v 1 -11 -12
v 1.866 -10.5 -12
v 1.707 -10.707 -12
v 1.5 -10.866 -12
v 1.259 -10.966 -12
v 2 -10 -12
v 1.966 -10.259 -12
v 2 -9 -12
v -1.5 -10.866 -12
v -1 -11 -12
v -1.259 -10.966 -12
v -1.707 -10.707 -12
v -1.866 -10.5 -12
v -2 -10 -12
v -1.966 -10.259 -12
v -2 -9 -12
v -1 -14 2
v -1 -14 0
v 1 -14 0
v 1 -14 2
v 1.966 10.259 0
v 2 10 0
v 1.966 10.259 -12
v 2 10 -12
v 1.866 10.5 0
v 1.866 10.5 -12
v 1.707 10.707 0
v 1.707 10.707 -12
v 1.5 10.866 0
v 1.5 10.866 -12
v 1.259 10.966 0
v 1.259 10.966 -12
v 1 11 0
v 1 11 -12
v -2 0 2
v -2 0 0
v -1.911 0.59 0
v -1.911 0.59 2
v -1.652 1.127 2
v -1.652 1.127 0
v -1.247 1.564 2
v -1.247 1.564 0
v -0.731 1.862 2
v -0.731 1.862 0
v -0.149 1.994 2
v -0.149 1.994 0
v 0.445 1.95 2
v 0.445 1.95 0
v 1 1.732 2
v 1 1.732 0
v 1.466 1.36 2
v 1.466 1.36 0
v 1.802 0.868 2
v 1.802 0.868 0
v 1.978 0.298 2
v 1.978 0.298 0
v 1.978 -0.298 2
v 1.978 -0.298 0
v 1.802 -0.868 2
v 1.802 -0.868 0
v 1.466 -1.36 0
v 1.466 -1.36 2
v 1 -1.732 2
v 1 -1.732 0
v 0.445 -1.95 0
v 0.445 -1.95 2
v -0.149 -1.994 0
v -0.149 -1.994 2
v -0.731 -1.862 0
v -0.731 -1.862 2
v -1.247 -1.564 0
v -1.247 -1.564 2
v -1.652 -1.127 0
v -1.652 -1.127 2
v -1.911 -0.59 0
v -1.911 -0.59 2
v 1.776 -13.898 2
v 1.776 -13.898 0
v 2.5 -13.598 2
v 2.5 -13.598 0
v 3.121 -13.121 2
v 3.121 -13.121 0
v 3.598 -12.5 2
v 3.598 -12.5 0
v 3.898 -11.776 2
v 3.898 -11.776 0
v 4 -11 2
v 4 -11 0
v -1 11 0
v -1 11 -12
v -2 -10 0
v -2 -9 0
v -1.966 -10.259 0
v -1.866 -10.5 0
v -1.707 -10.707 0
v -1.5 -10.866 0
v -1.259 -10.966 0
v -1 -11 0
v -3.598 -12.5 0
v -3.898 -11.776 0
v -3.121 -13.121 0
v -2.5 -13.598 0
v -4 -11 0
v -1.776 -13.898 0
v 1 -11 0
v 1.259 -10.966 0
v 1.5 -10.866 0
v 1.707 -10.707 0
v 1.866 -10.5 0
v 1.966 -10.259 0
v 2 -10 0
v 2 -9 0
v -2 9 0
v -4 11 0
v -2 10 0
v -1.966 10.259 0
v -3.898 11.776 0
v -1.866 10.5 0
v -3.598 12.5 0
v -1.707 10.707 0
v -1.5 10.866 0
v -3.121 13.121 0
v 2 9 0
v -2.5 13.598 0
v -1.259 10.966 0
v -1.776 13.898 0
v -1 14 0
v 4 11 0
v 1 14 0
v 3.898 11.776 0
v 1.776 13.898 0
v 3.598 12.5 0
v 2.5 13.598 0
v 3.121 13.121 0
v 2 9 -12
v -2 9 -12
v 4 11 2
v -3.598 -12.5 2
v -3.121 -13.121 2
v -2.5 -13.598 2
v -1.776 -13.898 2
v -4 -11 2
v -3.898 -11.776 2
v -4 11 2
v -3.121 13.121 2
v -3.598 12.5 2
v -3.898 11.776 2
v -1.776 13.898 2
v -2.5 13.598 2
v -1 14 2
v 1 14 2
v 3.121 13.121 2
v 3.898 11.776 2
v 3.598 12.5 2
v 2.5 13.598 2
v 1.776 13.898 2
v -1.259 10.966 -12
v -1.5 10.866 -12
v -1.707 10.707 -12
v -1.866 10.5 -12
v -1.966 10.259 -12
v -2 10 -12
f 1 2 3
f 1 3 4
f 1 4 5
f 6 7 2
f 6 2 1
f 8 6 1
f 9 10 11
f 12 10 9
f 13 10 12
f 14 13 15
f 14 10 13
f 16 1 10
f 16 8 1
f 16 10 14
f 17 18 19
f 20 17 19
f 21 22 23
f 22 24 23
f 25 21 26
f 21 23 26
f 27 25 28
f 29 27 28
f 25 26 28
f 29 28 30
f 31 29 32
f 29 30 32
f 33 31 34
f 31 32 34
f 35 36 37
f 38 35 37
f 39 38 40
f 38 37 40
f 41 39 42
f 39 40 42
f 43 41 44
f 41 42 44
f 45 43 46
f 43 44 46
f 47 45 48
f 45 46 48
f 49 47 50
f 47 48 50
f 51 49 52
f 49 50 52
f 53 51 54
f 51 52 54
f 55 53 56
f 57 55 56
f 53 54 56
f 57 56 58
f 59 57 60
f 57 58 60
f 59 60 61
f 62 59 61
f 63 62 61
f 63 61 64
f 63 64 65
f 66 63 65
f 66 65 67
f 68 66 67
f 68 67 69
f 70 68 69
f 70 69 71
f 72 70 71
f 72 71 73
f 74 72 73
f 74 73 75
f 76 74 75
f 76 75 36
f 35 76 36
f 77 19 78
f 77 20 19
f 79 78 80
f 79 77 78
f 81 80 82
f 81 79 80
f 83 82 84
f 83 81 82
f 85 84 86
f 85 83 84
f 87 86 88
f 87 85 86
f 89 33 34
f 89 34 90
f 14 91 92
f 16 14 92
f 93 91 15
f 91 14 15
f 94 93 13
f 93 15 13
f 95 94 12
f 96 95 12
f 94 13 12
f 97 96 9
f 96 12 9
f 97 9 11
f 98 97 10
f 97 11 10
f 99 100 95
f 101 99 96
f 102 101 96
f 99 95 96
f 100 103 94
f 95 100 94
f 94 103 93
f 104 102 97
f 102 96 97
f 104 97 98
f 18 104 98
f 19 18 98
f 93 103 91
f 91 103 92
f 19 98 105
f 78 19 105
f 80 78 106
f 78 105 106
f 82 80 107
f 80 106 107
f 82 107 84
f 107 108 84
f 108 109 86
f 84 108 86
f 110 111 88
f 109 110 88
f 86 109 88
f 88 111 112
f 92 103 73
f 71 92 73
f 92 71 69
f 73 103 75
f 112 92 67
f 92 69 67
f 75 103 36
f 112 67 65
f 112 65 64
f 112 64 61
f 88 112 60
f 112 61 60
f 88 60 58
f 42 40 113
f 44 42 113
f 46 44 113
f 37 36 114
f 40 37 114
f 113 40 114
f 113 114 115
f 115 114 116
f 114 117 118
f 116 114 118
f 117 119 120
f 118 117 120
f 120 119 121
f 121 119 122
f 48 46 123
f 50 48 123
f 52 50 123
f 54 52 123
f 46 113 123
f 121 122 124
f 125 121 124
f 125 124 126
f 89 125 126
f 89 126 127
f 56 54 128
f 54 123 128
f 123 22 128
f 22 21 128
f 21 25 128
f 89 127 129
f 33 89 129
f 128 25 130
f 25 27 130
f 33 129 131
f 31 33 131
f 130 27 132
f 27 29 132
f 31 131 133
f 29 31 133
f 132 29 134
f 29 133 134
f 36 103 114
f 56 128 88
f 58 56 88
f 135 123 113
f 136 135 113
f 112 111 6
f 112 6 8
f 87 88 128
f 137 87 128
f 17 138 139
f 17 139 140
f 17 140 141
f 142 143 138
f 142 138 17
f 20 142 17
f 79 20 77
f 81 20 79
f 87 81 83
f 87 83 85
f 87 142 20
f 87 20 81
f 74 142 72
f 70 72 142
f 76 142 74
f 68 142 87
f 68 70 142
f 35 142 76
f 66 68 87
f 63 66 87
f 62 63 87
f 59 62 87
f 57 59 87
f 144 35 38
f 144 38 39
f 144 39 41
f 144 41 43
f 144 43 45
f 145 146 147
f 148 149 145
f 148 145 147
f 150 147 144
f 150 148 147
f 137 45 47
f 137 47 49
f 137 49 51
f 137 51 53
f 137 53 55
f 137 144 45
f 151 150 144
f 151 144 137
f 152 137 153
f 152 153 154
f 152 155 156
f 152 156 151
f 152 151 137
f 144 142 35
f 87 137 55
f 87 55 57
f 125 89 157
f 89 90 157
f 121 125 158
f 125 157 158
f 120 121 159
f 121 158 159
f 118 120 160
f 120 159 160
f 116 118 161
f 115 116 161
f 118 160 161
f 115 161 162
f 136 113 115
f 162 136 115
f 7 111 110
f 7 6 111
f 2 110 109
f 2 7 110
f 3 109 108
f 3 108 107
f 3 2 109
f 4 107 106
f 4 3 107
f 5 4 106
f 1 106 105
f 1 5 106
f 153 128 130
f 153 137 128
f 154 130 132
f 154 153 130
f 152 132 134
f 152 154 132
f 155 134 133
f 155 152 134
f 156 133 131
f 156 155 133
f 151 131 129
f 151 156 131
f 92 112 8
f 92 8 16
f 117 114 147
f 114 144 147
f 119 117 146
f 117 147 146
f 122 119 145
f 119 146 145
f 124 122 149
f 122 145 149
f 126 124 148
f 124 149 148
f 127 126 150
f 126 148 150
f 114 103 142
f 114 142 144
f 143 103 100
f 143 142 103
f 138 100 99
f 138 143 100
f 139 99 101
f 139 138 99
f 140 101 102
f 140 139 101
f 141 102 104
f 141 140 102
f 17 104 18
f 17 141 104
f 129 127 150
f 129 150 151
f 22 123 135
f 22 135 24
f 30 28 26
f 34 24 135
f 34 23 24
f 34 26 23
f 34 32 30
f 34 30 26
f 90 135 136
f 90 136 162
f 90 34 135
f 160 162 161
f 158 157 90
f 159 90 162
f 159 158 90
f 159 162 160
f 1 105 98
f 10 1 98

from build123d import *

# Parameters (mm, degrees)
SKETCH1_W           = 8
SKETCH1_H           = 28
BOSS_EXTRUDE1_DEPTH = 2
FILLET1_R           = 3
SKETCH2_W           = 4
SKETCH2_H           = 2
BOSS_EXTRUDE2_DEPTH = 12
FILLET2_R           = 1
SKETCH3_R           = 2
CUT_EXTRUDE3_DEPTH  = 10


with BuildPart() as part:
    # Sketch1 → Boss-Extrude1 (new body)
    with BuildSketch(Plane.XY):
        Rectangle(SKETCH1_W, SKETCH1_H)
    extrude(amount=BOSS_EXTRUDE1_DEPTH)

    # Fillet1
    fillet1_edges = [part.edges().sort_by_distance(p)[0] for p in [
        (-4, 14, 1),
        (4, 14, 1),
        (4, -14, 1),
        (-4, -14, 1),
    ]]
    fillet(fillet1_edges, radius=FILLET1_R)

    # Sketch2 → Boss-Extrude2 (add)
    with BuildSketch(Plane(origin=(0, 0, 0), x_dir=(-1, 0, 0), z_dir=(0, 0, -1))):
        with Locations((0, 10)):
            Rectangle(SKETCH2_W, SKETCH2_H)
        with Locations((0, -10)):
            Rectangle(SKETCH2_W, SKETCH2_H)
    extrude(amount=BOSS_EXTRUDE2_DEPTH)

    # Fillet2
    fillet2_edges = [part.edges().sort_by_distance(p)[0] for p in [
        (2, 11, -6),
        (-2, 11, -6),
        (-2, -11, -6),
        (2, -11, -6),
    ]]
    fillet(fillet2_edges, radius=FILLET2_R)

    # Sketch3 → Cut-Extrude3 (cut)
    with BuildSketch(Plane(origin=(0, 0, 0), x_dir=(-1, 0, 0), z_dir=(0, 0, -1))):
        Circle(SKETCH3_R)
    extrude(amount=-CUT_EXTRUDE3_DEPTH, mode=Mode.SUBTRACT)


solid = part.part
